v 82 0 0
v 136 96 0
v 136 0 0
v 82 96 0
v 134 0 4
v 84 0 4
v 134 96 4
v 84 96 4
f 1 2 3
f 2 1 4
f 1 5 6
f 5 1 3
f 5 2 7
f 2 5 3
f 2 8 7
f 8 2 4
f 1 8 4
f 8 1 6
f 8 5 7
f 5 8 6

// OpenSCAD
module prism(x,y,z,l,w,h,m){

polyhedron([
//dehors_debut 0 1 2 3 4 5 6 7
[x,  y,z+h ],[  x,  y,  z ],[x+l,  y,  z ],[x+l,  y,z+h ],
[x+l-m,  y,z+h ],[x+l-m*0.5,  y,z+h-m ],[x+m*0.5,  y,z+h-m ],[x+m,  y,z+h ],
//middle_debut 8 9 10 11
[x+l-m,  y,z+h-m ],[x+m,  y,z+h-m ],
[x+l-m,  y+m,z+h-m ],[x+m,  y+m,z+h-m ],
//interieur debut et fin 12 13 14 15
[x+l-m,  y+m,z+m ],[x+m,  y+m,z+m ],
[x+l-m,  y+w-m,z+m ],[x+m,  y+w-m,z+m ],
//dehors_fin 16 17 18 19
[x,  y+w,z+h ],[  x,  y+w,  z ],[x+l,  y+w,  z ],[x+l,  y+w,z+h ],
//middle_fin_pics 20 21 22 23
[x+l-m,  y+w-m,z+h ],[x+l-m*0.5,  y+w-m,z+h-m ],[x+m*0.5,  y+w-m,z+h-m ],[x+m,  y+w-m,z+h ],
//fin_interieur 24 25
[x+l-m,  y+w-m,z+h-m ],[x+m,  y+w-m,z+h-m ],
],
[
[0,1,2,3,4,5,6,7],//debu_pic
[10,11,9,8],//epais_debu
[12,13,11,10],//verti_debu
[19,18,17,16],//fin
[13,12,14,15],//interieur_plat
[24,14,12,10],//cote_interieur
[11,13,15,25],//cote_interieur
[7,6,22,23],//ramp
[6,9,11,25,22],//ramp
[4,20,21,5],//ramp
[5,21,24,10,8],//ramp
[23,22,25,15,14,24,21,20],//epais_fin
[16,0,7,23,20,4,3,19],//dessus
[3,2,18,19],//cote
[16,17,1,0],//cote
[2,1,17,18],//dessous
]
);
    
}



module plak(x,y,z,l,w,h,m){

polyhedron([
[x+m*0.5,  y,z ],[  x+l-m*0.5,  y,  z ],[x+l-m*0.5,  y+w-m,  z ],[x+m*0.5,  y+w-m,z ],
[x+m,  y,z+m ],[  x+l-m,  y,  z+m ],[x+l-m,  y+w-m,  z+m ],[x+m,  y+w-m,z+m ],
],
[
[1,0,3,2],
[0,1,5,4],
[1,2,6,5],
[2,3,7,6],
[0,4,7,3],
[4,5,6,7],
]
);
    
}

prism(0, 0, 0, 60, 100, 35, 4);

plak(80, 0, 0, 58, 100, 35, 4);
